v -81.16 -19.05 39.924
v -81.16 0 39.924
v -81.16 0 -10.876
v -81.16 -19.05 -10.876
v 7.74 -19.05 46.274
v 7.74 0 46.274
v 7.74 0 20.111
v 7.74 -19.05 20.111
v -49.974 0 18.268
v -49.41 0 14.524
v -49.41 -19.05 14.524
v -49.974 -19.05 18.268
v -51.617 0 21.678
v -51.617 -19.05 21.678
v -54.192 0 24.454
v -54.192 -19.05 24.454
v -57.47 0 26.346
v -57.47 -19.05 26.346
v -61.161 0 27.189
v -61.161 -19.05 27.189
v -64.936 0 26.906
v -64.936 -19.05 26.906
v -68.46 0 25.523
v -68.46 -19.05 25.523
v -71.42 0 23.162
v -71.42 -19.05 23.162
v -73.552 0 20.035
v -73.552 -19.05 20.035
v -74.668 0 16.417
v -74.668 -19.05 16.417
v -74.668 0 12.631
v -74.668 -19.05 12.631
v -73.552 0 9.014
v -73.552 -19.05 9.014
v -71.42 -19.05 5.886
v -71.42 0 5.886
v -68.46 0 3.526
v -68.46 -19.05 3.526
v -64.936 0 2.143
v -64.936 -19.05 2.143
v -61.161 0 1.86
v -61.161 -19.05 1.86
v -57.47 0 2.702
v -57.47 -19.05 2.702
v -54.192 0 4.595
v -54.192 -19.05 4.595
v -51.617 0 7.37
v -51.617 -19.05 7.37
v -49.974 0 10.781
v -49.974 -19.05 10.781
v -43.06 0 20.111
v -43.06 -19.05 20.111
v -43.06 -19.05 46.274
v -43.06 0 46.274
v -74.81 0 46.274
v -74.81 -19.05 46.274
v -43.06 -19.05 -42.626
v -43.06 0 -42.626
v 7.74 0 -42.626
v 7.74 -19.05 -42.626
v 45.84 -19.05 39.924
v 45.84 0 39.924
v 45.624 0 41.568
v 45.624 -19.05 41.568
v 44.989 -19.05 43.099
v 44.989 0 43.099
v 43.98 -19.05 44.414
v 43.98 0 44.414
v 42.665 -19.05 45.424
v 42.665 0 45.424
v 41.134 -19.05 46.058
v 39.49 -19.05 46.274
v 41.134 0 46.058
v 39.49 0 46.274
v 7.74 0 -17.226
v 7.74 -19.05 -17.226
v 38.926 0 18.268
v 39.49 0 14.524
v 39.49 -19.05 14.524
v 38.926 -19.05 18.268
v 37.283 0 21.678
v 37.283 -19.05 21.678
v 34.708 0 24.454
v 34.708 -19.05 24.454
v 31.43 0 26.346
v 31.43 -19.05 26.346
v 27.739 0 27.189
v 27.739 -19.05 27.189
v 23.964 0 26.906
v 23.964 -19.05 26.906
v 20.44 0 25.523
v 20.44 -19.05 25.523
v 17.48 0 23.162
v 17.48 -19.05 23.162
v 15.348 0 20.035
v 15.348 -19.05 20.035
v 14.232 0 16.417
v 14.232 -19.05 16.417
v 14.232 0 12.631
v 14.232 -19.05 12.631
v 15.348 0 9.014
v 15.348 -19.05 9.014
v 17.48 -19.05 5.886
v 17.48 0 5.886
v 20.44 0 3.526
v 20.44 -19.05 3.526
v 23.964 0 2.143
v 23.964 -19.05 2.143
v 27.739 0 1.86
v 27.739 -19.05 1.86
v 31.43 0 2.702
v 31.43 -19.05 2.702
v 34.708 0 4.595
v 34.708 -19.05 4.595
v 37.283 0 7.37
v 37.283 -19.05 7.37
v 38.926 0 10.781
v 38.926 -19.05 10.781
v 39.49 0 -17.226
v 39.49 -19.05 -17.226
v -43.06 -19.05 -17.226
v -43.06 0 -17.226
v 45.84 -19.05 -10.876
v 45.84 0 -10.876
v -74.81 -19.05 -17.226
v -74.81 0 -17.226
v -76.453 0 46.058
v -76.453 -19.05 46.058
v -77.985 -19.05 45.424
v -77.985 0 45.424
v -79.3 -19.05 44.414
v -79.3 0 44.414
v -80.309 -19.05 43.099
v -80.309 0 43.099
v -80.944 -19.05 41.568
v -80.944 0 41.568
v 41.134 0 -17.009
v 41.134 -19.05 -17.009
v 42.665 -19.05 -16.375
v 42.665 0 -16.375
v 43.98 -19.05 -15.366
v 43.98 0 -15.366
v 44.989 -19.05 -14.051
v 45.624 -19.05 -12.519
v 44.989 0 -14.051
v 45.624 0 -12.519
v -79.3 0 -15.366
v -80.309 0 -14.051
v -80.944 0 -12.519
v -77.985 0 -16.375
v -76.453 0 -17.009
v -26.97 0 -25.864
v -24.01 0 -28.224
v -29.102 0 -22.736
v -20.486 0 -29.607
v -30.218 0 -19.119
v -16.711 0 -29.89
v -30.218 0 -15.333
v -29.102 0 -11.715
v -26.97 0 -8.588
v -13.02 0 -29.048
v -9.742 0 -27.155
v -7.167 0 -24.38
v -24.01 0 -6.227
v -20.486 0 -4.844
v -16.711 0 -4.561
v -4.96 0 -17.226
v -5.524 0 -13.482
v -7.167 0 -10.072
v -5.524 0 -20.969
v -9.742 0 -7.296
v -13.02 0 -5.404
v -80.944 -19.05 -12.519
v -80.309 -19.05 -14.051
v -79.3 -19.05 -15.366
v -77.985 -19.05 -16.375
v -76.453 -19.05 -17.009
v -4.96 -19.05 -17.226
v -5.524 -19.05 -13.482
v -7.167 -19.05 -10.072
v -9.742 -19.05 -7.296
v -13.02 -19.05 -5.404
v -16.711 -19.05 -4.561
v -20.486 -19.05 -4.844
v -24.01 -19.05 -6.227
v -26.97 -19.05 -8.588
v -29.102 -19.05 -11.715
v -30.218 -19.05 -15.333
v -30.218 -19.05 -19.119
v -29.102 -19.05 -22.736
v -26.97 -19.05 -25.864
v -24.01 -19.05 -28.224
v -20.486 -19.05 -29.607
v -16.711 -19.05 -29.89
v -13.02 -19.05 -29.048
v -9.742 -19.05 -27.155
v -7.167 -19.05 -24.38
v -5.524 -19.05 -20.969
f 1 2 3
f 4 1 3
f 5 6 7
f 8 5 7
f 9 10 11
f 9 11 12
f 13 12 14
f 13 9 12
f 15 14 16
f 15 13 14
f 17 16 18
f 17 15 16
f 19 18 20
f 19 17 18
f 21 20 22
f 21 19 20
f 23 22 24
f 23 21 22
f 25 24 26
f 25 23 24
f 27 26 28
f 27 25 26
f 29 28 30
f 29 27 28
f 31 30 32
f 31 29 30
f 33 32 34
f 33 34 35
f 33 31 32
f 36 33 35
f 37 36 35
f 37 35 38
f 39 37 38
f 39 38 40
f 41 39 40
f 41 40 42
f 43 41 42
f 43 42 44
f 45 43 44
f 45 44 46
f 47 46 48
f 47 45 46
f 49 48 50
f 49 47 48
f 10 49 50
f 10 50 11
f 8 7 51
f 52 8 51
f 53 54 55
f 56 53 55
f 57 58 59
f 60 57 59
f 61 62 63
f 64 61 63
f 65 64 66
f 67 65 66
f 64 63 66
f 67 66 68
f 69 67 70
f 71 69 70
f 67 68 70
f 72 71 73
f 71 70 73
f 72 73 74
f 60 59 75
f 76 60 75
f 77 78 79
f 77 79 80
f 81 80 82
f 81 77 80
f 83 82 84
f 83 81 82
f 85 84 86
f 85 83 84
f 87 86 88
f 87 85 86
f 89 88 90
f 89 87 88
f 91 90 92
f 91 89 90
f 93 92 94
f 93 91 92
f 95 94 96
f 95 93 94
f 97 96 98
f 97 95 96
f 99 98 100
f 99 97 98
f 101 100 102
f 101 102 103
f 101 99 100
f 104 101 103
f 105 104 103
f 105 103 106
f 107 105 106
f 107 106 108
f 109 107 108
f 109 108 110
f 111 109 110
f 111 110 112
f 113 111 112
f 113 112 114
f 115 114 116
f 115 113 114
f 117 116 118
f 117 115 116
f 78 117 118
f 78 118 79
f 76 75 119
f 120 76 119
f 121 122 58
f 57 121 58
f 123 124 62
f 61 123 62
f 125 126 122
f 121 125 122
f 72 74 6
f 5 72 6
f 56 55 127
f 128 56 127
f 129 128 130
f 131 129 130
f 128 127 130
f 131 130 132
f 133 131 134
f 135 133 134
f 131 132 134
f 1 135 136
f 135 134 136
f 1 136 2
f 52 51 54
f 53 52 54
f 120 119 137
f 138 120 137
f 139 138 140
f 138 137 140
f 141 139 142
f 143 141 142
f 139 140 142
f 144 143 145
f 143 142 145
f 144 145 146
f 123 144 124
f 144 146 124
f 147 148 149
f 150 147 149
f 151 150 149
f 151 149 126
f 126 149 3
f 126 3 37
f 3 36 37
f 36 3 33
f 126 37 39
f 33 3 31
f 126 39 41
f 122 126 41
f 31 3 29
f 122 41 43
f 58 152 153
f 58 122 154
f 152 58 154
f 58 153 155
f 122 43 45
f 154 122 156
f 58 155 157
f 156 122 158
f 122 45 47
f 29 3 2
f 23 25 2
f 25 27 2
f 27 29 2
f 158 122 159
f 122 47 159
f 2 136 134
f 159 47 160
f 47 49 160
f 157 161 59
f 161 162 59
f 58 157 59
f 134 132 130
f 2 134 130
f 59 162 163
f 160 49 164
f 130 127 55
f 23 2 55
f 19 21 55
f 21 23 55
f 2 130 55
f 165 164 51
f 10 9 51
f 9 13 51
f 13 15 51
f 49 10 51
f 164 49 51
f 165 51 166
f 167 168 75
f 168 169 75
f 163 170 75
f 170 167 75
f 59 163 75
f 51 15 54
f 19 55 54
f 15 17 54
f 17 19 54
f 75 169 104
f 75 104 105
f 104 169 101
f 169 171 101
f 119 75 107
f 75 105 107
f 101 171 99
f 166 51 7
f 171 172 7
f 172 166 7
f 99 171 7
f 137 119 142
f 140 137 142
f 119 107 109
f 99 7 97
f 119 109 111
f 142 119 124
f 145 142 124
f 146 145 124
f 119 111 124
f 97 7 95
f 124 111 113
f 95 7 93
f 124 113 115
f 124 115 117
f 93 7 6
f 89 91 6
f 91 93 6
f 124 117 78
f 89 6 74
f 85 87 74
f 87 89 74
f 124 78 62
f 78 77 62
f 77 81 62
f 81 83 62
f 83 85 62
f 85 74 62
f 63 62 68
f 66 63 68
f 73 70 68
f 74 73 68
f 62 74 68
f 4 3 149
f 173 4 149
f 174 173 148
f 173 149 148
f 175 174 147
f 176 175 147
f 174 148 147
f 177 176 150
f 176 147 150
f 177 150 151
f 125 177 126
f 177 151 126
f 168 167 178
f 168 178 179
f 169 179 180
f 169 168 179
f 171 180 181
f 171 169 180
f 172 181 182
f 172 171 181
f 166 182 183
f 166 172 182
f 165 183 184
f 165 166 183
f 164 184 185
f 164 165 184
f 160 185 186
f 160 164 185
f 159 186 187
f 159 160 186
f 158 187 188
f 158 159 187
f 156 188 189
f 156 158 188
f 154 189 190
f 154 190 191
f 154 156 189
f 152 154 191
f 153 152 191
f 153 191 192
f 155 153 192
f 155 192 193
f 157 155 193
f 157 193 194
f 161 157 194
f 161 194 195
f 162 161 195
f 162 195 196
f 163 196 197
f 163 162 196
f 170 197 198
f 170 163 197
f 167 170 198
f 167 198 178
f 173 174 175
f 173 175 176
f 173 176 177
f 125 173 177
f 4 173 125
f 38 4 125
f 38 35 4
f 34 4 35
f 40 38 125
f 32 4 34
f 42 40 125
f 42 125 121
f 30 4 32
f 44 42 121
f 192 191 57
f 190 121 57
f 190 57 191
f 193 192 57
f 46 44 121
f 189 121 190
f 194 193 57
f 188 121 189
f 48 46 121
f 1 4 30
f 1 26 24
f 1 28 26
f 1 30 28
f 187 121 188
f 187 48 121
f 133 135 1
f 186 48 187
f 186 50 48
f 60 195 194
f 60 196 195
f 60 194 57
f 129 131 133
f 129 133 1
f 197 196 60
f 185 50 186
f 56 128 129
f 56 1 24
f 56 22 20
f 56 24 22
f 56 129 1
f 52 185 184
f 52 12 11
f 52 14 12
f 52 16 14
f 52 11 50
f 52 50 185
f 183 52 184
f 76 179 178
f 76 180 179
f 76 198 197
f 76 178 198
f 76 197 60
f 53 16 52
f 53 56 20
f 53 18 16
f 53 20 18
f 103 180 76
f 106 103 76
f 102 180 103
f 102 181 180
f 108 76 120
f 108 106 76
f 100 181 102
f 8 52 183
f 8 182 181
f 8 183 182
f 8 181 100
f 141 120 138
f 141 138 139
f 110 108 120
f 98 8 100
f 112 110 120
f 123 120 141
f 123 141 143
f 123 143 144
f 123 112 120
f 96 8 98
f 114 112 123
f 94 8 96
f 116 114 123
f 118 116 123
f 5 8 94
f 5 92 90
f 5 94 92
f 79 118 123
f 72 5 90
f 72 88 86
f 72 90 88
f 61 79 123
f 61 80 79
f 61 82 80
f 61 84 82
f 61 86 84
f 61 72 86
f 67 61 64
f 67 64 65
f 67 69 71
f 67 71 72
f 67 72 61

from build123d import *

# Parameters (mm, degrees)
F0_R     = 12.7
F1_DEPTH = 19.05


with BuildPart() as f1:
    # F0 (on Front) → F1 (new body)
    with BuildSketch(Plane.XZ):
        with BuildLine():
            Line((-43.05991, 46.274296), (-74.80991, 46.274296))
            ThreePointArc((-74.80991, 46.274296), (-79.300038, 44.414424), (-81.15991, 39.924296))
            Line((-81.15991, 39.924296), (-81.15991, -10.875704))
            ThreePointArc((-81.15991, -10.875704), (-79.300038, -15.365832), (-74.80991, -17.225704))
            Line((-74.80991, -17.225704), (-43.05991, -17.225704))
            Line((-43.05991, -17.225704), (-43.05991, -42.625704))
            Line((-43.05991, -42.625704), (7.74009, -42.625704))
            Line((7.74009, -42.625704), (7.74009, -17.225704))
            Line((7.74009, -17.225704), (39.49009, -17.225704))
            ThreePointArc((39.49009, -17.225704), (43.980218, -15.365832), (45.84009, -10.875704))
            Line((45.84009, -10.875704), (45.84009, 39.924296))
            ThreePointArc((45.84009, 39.924296), (43.980218, 44.414424), (39.49009, 46.274296))
            Line((39.49009, 46.274296), (7.74009, 46.274296))
            Line((7.74009, 46.274296), (7.74009, 20.111208))
            Line((7.74009, 20.111208), (-43.05991, 20.111208))
            Line((-43.05991, 20.111208), (-43.05991, 46.274296))
        make_face()
        with Locations((-17.65991, -17.225704)):
            Circle(F0_R, mode=Mode.SUBTRACT)
        with Locations((-62.10991, 14.524296)):
            Circle(F0_R, mode=Mode.SUBTRACT)
        with Locations((26.79009, 14.524296)):
            Circle(F0_R, mode=Mode.SUBTRACT)
    extrude(amount=F1_DEPTH)


solid = f1.part
